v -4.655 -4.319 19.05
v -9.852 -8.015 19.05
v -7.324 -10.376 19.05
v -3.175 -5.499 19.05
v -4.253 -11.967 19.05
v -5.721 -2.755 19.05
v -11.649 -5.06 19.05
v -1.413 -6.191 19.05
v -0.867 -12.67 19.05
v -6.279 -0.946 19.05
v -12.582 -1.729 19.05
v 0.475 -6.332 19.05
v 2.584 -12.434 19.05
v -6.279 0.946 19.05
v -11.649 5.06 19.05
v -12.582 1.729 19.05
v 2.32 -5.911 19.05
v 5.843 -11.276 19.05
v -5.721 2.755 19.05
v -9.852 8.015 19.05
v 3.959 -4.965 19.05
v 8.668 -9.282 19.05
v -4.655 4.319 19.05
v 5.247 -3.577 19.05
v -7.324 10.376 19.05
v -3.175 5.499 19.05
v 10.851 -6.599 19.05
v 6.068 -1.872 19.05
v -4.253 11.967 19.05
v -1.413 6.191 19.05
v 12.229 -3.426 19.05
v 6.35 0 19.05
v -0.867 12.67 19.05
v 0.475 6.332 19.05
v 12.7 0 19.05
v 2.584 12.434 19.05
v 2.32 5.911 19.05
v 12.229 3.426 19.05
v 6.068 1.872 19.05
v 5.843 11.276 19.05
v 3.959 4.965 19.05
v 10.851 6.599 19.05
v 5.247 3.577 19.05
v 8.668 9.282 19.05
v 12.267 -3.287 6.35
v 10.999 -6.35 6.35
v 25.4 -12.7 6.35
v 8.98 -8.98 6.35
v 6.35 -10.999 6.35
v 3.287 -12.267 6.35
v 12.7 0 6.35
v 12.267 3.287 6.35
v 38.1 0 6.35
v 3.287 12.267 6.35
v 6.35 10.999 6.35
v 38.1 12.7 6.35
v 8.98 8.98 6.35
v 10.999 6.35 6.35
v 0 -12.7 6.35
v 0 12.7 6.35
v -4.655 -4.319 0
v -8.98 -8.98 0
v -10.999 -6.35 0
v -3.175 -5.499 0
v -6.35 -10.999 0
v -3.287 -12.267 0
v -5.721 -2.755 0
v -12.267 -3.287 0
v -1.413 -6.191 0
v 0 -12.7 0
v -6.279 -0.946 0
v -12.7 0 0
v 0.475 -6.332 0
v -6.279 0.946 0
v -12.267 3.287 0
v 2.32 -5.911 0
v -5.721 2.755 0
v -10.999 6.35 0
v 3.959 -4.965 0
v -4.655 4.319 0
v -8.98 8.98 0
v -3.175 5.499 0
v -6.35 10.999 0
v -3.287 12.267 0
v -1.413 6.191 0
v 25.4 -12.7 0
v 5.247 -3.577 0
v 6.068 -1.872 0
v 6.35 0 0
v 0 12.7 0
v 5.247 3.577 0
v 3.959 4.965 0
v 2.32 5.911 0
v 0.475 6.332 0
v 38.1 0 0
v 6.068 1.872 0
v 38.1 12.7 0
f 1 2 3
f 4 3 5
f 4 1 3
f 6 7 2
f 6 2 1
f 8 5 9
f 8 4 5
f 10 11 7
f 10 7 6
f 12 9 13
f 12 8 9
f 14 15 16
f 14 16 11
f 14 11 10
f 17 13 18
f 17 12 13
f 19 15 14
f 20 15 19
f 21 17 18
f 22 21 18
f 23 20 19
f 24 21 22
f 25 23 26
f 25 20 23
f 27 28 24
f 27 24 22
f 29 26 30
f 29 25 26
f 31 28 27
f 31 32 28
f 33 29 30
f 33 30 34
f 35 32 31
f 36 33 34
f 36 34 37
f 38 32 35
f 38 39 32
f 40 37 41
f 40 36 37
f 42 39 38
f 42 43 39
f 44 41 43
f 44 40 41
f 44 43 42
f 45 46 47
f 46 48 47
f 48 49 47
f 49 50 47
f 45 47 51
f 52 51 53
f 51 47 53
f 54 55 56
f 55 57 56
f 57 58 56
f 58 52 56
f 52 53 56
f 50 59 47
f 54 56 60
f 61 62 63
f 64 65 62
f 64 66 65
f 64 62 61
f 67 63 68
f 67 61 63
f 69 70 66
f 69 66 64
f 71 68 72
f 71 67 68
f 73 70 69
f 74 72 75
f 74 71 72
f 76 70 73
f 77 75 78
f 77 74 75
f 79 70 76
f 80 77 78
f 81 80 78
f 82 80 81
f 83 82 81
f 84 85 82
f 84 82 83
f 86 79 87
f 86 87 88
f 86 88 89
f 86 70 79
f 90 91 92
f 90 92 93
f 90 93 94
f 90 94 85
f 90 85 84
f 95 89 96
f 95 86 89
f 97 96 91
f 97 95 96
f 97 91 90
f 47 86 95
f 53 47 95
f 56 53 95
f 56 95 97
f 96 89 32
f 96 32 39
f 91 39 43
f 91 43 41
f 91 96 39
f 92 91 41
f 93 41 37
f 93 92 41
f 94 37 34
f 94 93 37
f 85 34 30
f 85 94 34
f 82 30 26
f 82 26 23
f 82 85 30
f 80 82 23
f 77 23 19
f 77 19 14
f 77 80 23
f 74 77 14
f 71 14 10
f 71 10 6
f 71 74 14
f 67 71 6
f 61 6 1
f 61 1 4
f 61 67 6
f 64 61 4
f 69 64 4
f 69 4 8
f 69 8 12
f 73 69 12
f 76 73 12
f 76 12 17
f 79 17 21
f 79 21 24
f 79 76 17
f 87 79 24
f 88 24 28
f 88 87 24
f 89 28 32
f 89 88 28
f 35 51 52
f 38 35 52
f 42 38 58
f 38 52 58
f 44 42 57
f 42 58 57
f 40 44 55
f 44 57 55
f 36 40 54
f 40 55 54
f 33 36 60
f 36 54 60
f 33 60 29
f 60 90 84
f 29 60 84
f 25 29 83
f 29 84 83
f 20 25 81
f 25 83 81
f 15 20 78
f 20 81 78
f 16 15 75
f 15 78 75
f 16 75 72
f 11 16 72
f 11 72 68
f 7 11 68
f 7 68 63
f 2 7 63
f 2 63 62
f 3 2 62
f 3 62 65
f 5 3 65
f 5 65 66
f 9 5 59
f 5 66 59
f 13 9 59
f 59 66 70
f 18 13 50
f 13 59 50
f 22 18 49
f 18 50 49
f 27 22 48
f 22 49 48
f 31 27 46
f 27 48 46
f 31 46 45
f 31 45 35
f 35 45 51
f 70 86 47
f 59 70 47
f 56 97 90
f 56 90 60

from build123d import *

# Parameters (mm, degrees)
F0_R     = 12.7
F0_R_2   = 6.35
F1_DEPTH = 19.05
F3_W     = 25.4
F3_H     = 6.35
F6_DEPTH = 19.051


with BuildPart() as f1:
    # F0 (on Top) → F1 (new body)
    with BuildSketch(Plane.XY):
        Circle(F0_R)
        Circle(F0_R_2, mode=Mode.SUBTRACT)
    extrude(amount=F1_DEPTH)

    # F3 (on offset) → F4 (join, up to the next surface of F1)
    with BuildSketch(Plane.YZ.offset(38.1)):
        with Locations((0, 3.175)):
            Rectangle(F3_W, F3_H)
    extrude(until=Until.NEXT, dir=(-1, 0, 0))

    # F5 (on face) → F6 (cut, through all)
    with BuildSketch(Plane(origin=(0, 0, 0), x_dir=(1, 0, 0), z_dir=(0, 0, -1))):
        Polygon((25.4, 12.7), (38.1, 0), (38.1, 12.7), align=None)
    extrude(amount=-F6_DEPTH, mode=Mode.SUBTRACT)


solid = f1.part
